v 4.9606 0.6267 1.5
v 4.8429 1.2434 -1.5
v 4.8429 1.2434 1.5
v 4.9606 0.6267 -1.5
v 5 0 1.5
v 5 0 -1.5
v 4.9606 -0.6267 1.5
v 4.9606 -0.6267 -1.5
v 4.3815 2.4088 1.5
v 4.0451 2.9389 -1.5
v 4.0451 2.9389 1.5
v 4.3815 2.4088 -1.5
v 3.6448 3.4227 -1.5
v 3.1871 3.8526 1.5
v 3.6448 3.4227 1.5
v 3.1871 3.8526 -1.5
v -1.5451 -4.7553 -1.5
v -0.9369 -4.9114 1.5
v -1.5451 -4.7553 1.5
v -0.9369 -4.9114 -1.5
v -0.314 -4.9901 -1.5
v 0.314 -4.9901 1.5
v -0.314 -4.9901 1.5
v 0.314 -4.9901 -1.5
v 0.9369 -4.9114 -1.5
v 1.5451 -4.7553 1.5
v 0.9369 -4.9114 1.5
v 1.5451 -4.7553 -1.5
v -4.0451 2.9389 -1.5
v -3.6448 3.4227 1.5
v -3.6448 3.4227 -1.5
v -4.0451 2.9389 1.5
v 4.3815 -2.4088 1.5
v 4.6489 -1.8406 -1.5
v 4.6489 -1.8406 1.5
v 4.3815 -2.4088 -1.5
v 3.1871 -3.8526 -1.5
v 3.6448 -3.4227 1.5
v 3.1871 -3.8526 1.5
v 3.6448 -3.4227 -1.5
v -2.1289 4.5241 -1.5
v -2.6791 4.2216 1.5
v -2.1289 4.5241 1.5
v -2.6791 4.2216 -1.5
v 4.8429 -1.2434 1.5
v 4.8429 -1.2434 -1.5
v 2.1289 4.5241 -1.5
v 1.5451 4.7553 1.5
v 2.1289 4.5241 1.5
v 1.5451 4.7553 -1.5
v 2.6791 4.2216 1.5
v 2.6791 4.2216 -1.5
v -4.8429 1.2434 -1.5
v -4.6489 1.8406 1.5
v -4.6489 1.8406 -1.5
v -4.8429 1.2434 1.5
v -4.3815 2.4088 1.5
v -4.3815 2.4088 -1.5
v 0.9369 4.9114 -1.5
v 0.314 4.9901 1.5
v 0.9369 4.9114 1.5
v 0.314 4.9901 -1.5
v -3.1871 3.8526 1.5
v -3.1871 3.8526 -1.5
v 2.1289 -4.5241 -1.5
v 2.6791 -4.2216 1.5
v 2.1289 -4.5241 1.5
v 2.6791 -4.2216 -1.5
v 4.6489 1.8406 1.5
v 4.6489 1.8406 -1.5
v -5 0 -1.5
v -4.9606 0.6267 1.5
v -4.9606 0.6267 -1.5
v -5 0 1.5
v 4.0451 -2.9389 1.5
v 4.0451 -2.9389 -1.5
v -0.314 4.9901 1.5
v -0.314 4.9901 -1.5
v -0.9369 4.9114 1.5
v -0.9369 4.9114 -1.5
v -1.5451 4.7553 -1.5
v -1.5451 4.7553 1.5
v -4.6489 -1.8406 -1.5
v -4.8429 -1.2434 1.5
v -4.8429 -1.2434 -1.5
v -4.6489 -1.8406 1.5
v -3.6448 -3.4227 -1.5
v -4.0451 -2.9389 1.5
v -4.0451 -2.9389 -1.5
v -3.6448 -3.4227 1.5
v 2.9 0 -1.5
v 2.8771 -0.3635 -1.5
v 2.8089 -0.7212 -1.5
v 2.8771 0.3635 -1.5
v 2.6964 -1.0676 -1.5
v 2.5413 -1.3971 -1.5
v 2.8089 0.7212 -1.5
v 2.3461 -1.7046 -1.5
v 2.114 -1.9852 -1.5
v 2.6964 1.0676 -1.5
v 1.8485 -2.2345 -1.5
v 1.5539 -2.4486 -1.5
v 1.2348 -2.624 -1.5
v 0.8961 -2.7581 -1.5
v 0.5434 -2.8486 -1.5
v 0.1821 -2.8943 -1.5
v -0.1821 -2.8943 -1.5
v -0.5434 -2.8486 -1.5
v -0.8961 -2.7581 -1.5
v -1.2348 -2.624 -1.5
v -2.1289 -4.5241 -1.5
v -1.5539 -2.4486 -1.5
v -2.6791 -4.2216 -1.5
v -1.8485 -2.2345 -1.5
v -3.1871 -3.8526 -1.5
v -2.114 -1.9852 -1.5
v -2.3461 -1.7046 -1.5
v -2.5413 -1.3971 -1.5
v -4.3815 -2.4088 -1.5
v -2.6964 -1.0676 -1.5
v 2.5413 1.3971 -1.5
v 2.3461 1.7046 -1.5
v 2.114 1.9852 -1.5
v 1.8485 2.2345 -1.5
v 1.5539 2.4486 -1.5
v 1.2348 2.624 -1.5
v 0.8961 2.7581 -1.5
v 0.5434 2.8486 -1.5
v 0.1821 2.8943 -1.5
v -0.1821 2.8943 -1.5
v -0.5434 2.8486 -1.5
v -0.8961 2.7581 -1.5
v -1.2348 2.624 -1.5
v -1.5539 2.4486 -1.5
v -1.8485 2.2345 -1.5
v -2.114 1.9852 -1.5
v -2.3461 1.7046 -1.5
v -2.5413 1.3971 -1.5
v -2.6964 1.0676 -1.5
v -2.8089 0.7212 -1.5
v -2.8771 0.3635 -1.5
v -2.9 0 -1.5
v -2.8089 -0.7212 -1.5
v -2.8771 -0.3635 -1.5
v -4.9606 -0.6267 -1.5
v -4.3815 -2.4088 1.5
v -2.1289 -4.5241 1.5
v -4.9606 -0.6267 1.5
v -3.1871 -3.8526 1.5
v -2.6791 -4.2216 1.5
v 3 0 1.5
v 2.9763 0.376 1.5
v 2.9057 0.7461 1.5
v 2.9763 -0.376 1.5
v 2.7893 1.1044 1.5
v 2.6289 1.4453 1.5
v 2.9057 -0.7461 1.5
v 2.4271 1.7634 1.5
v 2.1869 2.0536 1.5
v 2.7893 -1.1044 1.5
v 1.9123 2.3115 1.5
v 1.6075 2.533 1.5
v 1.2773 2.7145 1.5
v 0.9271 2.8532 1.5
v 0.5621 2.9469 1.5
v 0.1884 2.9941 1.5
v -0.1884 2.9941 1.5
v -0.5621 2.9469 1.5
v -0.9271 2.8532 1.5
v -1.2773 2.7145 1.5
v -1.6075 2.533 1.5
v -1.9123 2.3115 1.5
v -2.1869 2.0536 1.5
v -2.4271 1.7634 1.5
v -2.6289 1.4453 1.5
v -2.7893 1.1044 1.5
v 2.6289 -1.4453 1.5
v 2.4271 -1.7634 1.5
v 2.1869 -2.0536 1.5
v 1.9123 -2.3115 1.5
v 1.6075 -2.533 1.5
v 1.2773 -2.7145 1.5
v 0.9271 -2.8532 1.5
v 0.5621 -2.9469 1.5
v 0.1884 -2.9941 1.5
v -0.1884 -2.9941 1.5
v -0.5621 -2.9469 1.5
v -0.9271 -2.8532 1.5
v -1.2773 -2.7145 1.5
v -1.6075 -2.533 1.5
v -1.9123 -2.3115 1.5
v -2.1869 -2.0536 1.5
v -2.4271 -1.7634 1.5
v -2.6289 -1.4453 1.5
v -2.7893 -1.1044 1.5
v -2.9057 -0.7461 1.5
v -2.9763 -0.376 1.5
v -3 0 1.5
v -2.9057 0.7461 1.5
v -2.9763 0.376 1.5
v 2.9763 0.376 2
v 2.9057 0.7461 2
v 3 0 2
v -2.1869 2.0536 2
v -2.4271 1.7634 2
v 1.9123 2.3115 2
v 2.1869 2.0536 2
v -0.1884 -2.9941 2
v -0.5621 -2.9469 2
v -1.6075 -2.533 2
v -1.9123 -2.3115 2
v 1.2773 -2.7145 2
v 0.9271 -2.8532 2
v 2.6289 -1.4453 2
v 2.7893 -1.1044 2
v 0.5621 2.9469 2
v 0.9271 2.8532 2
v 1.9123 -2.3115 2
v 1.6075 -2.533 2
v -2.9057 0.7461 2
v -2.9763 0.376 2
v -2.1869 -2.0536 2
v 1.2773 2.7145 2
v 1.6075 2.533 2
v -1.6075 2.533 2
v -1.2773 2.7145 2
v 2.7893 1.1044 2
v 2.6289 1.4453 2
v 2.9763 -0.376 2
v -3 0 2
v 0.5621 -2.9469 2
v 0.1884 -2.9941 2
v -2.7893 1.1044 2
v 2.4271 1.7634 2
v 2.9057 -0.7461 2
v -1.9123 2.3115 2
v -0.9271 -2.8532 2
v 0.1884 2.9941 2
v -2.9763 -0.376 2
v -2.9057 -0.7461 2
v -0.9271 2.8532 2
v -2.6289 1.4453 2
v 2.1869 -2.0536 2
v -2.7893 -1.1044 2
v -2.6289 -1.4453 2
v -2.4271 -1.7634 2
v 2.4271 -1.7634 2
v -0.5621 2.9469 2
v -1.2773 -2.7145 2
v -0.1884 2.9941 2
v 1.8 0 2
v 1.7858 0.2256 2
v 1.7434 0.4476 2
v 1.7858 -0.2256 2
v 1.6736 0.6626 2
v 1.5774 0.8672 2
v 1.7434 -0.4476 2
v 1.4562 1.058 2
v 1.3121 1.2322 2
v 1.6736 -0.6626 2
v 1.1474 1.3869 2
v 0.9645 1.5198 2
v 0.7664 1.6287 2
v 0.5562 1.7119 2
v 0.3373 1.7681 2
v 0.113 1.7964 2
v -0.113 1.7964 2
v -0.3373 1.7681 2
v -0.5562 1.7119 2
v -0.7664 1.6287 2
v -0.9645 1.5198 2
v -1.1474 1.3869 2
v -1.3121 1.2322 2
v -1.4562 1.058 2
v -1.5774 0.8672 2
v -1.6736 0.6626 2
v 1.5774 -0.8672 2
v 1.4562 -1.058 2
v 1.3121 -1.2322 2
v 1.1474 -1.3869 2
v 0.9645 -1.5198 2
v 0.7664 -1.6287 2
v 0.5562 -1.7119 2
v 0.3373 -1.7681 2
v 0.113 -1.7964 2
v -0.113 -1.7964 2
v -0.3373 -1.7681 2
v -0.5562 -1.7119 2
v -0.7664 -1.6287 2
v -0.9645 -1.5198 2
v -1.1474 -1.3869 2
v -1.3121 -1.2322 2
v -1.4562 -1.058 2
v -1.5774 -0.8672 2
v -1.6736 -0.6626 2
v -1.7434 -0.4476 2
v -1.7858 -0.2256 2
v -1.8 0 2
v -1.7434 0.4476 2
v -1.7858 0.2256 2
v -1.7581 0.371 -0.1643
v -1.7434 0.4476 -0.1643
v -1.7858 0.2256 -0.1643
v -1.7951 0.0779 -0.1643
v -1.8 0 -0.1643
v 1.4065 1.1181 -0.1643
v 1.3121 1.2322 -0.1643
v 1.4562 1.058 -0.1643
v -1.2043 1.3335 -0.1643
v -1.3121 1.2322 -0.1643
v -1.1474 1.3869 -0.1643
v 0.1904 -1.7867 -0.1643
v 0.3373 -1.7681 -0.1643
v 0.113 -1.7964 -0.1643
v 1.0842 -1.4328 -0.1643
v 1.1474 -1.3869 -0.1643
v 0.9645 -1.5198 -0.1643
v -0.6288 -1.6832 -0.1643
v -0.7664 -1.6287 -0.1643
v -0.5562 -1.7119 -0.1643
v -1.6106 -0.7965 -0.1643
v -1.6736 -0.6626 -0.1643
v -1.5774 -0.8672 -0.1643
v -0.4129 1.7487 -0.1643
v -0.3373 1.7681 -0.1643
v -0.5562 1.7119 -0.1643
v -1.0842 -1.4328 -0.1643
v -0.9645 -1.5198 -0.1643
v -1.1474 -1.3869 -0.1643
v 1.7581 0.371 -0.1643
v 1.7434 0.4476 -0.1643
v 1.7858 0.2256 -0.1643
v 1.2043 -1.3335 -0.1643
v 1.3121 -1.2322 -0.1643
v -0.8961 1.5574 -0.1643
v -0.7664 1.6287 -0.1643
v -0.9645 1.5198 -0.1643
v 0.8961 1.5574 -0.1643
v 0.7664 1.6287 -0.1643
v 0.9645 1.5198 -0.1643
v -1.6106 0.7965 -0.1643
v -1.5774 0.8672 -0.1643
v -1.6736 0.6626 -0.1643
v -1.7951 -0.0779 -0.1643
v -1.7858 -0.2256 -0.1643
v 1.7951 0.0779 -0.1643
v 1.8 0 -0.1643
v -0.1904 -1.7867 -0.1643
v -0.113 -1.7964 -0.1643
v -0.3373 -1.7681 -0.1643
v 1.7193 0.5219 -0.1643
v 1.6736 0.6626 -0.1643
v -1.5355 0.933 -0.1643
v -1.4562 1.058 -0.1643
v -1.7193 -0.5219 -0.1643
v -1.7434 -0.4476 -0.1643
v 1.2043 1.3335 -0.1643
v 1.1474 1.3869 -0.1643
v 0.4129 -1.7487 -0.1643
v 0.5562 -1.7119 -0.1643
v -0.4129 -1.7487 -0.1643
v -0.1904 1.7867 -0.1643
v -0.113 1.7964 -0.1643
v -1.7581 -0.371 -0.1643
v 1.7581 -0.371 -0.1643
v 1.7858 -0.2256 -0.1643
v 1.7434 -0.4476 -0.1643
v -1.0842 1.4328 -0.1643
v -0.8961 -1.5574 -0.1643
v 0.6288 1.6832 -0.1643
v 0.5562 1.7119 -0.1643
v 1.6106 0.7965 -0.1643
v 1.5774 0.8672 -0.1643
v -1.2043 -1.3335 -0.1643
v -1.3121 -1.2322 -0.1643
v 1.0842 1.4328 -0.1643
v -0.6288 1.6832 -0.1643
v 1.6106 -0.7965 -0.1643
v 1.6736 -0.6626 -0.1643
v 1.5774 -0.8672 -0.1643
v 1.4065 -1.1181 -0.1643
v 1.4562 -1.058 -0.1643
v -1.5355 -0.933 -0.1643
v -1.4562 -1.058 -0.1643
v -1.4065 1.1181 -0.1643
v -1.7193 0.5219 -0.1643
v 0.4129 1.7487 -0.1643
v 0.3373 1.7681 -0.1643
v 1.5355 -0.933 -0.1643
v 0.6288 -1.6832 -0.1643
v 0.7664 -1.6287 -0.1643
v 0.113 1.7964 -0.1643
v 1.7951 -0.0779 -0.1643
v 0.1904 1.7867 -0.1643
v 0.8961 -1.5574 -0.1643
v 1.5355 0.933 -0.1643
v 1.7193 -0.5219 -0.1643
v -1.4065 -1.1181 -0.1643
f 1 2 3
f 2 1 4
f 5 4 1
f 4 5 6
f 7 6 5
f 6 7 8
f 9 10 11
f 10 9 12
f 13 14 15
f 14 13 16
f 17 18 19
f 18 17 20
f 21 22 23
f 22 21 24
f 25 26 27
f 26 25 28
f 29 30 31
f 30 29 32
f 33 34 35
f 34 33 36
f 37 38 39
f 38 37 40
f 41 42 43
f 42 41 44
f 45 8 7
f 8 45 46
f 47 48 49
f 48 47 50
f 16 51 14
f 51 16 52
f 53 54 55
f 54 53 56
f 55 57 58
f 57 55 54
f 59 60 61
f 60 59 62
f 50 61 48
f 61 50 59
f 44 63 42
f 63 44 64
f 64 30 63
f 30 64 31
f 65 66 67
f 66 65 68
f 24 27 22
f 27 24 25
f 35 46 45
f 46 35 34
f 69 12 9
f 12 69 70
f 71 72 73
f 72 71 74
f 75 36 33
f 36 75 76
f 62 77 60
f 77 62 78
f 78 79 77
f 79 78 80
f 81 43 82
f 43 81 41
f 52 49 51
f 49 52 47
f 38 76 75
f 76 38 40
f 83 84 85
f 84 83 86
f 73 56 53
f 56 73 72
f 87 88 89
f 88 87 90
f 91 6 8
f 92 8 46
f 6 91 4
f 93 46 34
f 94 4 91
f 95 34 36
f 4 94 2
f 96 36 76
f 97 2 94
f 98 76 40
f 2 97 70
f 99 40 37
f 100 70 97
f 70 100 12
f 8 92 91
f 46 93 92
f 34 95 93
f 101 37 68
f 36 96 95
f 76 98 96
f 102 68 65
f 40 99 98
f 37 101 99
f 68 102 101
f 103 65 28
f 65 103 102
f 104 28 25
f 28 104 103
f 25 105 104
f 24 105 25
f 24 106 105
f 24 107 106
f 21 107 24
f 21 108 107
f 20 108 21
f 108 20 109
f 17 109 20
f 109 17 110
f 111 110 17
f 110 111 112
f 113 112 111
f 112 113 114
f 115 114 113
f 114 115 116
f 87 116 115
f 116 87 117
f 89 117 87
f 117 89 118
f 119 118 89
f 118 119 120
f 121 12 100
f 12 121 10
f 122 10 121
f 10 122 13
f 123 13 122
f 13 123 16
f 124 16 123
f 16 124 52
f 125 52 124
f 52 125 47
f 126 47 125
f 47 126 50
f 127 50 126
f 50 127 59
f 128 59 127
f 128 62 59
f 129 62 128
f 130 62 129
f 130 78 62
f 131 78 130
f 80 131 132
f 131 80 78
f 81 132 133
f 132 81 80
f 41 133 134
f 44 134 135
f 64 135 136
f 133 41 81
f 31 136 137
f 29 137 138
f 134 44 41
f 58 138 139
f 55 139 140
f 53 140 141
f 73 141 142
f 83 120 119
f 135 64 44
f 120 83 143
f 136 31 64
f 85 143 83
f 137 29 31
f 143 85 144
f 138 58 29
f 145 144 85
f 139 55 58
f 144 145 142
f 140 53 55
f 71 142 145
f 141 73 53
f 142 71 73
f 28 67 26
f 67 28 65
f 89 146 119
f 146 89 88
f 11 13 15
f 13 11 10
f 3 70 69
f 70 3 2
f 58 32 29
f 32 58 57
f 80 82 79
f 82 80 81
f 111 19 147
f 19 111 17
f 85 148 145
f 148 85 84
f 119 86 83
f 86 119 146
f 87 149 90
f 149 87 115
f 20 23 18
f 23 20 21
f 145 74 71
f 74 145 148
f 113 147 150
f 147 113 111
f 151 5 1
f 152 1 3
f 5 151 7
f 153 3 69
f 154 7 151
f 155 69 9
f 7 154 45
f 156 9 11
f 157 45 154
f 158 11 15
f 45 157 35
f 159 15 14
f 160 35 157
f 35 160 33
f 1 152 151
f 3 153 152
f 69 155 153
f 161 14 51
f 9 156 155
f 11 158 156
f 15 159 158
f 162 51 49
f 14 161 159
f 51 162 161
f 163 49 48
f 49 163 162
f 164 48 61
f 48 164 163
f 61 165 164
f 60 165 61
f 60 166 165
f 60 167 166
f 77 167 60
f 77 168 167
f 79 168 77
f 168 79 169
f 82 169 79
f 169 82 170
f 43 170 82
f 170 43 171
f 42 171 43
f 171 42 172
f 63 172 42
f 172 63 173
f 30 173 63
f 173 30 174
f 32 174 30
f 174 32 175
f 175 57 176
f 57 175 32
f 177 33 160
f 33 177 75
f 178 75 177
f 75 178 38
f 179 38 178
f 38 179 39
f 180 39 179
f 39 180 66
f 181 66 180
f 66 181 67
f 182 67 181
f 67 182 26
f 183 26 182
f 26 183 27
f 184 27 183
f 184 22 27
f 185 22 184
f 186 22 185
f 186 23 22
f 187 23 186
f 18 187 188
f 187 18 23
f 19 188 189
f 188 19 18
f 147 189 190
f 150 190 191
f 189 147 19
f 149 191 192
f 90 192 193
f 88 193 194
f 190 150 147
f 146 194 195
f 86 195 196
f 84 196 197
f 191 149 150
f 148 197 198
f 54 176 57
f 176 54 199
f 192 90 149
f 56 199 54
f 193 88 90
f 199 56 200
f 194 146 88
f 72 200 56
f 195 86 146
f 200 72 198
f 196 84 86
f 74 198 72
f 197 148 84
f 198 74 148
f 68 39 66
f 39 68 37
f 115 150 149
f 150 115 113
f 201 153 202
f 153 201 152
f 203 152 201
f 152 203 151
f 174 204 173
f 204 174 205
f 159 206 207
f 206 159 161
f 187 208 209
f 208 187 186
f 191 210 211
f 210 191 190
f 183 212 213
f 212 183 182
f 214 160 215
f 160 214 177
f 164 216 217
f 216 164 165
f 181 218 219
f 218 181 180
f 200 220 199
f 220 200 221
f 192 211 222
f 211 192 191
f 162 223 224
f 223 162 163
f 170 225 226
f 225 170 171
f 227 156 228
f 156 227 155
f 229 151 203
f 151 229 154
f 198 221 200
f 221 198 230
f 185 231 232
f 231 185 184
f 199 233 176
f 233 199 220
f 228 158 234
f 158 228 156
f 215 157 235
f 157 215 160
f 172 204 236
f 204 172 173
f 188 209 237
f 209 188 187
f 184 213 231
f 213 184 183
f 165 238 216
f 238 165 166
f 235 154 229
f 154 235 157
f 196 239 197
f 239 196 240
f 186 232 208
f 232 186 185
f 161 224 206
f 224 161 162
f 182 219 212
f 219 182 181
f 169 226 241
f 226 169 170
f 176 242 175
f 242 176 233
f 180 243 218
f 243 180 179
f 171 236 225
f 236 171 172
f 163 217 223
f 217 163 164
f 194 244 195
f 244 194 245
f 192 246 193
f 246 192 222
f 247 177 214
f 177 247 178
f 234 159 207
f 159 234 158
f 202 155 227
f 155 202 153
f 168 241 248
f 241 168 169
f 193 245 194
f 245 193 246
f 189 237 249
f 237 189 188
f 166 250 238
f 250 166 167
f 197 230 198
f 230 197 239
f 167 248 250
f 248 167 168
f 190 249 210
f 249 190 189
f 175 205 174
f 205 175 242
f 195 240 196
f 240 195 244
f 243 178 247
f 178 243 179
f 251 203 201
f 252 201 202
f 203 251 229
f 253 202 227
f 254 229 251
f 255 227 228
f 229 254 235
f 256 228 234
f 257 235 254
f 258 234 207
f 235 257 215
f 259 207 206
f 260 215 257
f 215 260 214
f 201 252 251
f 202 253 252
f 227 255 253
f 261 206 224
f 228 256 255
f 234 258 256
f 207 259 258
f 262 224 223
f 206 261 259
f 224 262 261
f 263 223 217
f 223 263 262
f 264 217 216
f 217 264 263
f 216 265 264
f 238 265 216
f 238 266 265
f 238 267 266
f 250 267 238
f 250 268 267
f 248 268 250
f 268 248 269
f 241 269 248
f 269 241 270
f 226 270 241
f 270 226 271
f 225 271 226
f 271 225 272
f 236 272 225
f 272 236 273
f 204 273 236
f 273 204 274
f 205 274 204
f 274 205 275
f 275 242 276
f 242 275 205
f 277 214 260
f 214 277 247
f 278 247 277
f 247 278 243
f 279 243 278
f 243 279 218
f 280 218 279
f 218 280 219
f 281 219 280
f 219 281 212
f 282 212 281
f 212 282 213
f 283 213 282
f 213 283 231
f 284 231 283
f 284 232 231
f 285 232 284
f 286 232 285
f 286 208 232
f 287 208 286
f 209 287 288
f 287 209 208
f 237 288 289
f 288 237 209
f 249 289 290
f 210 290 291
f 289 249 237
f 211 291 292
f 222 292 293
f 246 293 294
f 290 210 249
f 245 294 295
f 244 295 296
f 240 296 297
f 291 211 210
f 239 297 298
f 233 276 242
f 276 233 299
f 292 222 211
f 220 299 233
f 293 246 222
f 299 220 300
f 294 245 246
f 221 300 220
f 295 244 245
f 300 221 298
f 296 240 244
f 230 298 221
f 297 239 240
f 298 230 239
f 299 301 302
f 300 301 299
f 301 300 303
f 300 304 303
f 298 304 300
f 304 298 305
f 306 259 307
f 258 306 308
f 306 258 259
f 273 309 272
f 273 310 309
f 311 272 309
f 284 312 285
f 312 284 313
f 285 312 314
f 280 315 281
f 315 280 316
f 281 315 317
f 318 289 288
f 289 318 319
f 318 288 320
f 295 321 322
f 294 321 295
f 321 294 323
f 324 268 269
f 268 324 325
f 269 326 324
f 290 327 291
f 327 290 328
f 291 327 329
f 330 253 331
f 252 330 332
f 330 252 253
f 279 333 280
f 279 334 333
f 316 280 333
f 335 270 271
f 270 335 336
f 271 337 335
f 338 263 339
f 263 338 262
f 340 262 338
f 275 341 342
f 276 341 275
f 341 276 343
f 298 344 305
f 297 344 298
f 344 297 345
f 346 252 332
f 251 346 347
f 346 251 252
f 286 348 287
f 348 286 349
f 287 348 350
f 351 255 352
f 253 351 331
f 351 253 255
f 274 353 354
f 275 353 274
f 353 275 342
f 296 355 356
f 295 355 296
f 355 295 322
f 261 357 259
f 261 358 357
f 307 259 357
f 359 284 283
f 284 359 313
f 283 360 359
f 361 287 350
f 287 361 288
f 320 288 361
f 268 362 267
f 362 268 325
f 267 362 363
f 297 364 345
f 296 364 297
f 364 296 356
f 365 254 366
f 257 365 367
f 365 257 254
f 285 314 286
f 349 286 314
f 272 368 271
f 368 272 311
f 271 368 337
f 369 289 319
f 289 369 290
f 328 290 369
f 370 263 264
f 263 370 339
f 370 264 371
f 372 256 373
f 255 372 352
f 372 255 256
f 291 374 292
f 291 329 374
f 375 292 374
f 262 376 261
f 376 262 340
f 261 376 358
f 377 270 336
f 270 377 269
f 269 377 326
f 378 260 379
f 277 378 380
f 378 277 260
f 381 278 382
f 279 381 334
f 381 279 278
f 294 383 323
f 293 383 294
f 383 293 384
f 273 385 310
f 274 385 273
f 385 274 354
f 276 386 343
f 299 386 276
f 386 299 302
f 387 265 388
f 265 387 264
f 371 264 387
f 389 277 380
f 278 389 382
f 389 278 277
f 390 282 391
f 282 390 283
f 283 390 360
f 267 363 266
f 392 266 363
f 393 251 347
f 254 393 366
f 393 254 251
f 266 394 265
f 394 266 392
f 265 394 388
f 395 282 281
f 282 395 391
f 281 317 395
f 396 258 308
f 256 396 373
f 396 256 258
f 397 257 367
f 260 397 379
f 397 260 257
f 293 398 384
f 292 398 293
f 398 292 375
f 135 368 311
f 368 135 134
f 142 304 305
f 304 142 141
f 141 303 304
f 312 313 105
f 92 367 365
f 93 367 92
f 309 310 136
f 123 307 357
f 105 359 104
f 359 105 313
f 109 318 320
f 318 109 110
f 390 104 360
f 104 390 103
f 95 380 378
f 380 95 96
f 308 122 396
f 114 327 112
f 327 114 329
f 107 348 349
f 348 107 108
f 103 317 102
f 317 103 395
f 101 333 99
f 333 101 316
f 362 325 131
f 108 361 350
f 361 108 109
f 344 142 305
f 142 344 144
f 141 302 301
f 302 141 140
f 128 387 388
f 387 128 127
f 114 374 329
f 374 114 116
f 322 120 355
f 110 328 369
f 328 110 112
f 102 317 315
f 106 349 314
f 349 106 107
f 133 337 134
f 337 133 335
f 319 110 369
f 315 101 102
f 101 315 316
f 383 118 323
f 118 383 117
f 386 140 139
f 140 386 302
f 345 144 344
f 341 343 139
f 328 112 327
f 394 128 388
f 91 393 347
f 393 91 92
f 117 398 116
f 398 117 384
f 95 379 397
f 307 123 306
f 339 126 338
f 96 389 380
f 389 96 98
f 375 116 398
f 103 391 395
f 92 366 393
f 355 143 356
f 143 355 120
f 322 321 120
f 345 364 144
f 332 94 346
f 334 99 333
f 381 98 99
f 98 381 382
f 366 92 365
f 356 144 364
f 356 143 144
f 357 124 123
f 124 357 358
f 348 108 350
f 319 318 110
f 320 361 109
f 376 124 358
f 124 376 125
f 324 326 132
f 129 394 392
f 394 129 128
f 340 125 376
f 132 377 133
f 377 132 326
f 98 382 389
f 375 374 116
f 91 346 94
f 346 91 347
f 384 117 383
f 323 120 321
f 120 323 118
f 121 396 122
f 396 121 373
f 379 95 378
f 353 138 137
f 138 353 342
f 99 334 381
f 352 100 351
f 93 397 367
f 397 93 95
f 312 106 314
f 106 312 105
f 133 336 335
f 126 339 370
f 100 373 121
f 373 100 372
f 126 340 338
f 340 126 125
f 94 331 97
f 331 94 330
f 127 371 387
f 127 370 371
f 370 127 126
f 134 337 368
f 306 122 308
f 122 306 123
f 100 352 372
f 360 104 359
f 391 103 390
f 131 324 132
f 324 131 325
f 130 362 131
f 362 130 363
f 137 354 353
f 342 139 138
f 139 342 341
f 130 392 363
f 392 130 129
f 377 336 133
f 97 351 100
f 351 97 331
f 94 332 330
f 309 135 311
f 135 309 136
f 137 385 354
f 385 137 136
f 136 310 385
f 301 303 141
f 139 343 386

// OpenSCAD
$fn = 50;


difference() {
	union() {
		translate(v = [0, 0, -1.5000000000]) {
			cylinder(h = 3, r = 5.0000000000);
		}
		translate(v = [0, 0, -1.5000000000]) {
			cylinder(h = 3.5000000000, r = 3.0000000000);
		}
	}
	union() {
		translate(v = [0, 0, -1.5000000000]) {
			rotate(a = [0, 180, 0]) {
				difference() {
					union() {
						translate(v = [0, 0, -3.5000000000]) {
							cylinder(h = 3.5000000000, r = 1.5000000000);
						}
						translate(v = [0, 0, -3.5000000000]) {
							cylinder(h = 3.5000000000, r = 1.8000000000);
						}
						translate(v = [0, 0, -1.7000000000]) {
							cylinder(h = 1.7000000000, r1 = 1.5000000000, r2 = 2.9000000000);
						}
						translate(v = [0, 0, -3.5000000000]) {
							cylinder(h = 3.5000000000, r = 1.5000000000);
						}
					}
					union();
				}
			}
		}
		translate(v = [0, 0, -50.0000000000]) {
			cylinder(h = 100, r = 1.5000000000);
		}
	}
}
